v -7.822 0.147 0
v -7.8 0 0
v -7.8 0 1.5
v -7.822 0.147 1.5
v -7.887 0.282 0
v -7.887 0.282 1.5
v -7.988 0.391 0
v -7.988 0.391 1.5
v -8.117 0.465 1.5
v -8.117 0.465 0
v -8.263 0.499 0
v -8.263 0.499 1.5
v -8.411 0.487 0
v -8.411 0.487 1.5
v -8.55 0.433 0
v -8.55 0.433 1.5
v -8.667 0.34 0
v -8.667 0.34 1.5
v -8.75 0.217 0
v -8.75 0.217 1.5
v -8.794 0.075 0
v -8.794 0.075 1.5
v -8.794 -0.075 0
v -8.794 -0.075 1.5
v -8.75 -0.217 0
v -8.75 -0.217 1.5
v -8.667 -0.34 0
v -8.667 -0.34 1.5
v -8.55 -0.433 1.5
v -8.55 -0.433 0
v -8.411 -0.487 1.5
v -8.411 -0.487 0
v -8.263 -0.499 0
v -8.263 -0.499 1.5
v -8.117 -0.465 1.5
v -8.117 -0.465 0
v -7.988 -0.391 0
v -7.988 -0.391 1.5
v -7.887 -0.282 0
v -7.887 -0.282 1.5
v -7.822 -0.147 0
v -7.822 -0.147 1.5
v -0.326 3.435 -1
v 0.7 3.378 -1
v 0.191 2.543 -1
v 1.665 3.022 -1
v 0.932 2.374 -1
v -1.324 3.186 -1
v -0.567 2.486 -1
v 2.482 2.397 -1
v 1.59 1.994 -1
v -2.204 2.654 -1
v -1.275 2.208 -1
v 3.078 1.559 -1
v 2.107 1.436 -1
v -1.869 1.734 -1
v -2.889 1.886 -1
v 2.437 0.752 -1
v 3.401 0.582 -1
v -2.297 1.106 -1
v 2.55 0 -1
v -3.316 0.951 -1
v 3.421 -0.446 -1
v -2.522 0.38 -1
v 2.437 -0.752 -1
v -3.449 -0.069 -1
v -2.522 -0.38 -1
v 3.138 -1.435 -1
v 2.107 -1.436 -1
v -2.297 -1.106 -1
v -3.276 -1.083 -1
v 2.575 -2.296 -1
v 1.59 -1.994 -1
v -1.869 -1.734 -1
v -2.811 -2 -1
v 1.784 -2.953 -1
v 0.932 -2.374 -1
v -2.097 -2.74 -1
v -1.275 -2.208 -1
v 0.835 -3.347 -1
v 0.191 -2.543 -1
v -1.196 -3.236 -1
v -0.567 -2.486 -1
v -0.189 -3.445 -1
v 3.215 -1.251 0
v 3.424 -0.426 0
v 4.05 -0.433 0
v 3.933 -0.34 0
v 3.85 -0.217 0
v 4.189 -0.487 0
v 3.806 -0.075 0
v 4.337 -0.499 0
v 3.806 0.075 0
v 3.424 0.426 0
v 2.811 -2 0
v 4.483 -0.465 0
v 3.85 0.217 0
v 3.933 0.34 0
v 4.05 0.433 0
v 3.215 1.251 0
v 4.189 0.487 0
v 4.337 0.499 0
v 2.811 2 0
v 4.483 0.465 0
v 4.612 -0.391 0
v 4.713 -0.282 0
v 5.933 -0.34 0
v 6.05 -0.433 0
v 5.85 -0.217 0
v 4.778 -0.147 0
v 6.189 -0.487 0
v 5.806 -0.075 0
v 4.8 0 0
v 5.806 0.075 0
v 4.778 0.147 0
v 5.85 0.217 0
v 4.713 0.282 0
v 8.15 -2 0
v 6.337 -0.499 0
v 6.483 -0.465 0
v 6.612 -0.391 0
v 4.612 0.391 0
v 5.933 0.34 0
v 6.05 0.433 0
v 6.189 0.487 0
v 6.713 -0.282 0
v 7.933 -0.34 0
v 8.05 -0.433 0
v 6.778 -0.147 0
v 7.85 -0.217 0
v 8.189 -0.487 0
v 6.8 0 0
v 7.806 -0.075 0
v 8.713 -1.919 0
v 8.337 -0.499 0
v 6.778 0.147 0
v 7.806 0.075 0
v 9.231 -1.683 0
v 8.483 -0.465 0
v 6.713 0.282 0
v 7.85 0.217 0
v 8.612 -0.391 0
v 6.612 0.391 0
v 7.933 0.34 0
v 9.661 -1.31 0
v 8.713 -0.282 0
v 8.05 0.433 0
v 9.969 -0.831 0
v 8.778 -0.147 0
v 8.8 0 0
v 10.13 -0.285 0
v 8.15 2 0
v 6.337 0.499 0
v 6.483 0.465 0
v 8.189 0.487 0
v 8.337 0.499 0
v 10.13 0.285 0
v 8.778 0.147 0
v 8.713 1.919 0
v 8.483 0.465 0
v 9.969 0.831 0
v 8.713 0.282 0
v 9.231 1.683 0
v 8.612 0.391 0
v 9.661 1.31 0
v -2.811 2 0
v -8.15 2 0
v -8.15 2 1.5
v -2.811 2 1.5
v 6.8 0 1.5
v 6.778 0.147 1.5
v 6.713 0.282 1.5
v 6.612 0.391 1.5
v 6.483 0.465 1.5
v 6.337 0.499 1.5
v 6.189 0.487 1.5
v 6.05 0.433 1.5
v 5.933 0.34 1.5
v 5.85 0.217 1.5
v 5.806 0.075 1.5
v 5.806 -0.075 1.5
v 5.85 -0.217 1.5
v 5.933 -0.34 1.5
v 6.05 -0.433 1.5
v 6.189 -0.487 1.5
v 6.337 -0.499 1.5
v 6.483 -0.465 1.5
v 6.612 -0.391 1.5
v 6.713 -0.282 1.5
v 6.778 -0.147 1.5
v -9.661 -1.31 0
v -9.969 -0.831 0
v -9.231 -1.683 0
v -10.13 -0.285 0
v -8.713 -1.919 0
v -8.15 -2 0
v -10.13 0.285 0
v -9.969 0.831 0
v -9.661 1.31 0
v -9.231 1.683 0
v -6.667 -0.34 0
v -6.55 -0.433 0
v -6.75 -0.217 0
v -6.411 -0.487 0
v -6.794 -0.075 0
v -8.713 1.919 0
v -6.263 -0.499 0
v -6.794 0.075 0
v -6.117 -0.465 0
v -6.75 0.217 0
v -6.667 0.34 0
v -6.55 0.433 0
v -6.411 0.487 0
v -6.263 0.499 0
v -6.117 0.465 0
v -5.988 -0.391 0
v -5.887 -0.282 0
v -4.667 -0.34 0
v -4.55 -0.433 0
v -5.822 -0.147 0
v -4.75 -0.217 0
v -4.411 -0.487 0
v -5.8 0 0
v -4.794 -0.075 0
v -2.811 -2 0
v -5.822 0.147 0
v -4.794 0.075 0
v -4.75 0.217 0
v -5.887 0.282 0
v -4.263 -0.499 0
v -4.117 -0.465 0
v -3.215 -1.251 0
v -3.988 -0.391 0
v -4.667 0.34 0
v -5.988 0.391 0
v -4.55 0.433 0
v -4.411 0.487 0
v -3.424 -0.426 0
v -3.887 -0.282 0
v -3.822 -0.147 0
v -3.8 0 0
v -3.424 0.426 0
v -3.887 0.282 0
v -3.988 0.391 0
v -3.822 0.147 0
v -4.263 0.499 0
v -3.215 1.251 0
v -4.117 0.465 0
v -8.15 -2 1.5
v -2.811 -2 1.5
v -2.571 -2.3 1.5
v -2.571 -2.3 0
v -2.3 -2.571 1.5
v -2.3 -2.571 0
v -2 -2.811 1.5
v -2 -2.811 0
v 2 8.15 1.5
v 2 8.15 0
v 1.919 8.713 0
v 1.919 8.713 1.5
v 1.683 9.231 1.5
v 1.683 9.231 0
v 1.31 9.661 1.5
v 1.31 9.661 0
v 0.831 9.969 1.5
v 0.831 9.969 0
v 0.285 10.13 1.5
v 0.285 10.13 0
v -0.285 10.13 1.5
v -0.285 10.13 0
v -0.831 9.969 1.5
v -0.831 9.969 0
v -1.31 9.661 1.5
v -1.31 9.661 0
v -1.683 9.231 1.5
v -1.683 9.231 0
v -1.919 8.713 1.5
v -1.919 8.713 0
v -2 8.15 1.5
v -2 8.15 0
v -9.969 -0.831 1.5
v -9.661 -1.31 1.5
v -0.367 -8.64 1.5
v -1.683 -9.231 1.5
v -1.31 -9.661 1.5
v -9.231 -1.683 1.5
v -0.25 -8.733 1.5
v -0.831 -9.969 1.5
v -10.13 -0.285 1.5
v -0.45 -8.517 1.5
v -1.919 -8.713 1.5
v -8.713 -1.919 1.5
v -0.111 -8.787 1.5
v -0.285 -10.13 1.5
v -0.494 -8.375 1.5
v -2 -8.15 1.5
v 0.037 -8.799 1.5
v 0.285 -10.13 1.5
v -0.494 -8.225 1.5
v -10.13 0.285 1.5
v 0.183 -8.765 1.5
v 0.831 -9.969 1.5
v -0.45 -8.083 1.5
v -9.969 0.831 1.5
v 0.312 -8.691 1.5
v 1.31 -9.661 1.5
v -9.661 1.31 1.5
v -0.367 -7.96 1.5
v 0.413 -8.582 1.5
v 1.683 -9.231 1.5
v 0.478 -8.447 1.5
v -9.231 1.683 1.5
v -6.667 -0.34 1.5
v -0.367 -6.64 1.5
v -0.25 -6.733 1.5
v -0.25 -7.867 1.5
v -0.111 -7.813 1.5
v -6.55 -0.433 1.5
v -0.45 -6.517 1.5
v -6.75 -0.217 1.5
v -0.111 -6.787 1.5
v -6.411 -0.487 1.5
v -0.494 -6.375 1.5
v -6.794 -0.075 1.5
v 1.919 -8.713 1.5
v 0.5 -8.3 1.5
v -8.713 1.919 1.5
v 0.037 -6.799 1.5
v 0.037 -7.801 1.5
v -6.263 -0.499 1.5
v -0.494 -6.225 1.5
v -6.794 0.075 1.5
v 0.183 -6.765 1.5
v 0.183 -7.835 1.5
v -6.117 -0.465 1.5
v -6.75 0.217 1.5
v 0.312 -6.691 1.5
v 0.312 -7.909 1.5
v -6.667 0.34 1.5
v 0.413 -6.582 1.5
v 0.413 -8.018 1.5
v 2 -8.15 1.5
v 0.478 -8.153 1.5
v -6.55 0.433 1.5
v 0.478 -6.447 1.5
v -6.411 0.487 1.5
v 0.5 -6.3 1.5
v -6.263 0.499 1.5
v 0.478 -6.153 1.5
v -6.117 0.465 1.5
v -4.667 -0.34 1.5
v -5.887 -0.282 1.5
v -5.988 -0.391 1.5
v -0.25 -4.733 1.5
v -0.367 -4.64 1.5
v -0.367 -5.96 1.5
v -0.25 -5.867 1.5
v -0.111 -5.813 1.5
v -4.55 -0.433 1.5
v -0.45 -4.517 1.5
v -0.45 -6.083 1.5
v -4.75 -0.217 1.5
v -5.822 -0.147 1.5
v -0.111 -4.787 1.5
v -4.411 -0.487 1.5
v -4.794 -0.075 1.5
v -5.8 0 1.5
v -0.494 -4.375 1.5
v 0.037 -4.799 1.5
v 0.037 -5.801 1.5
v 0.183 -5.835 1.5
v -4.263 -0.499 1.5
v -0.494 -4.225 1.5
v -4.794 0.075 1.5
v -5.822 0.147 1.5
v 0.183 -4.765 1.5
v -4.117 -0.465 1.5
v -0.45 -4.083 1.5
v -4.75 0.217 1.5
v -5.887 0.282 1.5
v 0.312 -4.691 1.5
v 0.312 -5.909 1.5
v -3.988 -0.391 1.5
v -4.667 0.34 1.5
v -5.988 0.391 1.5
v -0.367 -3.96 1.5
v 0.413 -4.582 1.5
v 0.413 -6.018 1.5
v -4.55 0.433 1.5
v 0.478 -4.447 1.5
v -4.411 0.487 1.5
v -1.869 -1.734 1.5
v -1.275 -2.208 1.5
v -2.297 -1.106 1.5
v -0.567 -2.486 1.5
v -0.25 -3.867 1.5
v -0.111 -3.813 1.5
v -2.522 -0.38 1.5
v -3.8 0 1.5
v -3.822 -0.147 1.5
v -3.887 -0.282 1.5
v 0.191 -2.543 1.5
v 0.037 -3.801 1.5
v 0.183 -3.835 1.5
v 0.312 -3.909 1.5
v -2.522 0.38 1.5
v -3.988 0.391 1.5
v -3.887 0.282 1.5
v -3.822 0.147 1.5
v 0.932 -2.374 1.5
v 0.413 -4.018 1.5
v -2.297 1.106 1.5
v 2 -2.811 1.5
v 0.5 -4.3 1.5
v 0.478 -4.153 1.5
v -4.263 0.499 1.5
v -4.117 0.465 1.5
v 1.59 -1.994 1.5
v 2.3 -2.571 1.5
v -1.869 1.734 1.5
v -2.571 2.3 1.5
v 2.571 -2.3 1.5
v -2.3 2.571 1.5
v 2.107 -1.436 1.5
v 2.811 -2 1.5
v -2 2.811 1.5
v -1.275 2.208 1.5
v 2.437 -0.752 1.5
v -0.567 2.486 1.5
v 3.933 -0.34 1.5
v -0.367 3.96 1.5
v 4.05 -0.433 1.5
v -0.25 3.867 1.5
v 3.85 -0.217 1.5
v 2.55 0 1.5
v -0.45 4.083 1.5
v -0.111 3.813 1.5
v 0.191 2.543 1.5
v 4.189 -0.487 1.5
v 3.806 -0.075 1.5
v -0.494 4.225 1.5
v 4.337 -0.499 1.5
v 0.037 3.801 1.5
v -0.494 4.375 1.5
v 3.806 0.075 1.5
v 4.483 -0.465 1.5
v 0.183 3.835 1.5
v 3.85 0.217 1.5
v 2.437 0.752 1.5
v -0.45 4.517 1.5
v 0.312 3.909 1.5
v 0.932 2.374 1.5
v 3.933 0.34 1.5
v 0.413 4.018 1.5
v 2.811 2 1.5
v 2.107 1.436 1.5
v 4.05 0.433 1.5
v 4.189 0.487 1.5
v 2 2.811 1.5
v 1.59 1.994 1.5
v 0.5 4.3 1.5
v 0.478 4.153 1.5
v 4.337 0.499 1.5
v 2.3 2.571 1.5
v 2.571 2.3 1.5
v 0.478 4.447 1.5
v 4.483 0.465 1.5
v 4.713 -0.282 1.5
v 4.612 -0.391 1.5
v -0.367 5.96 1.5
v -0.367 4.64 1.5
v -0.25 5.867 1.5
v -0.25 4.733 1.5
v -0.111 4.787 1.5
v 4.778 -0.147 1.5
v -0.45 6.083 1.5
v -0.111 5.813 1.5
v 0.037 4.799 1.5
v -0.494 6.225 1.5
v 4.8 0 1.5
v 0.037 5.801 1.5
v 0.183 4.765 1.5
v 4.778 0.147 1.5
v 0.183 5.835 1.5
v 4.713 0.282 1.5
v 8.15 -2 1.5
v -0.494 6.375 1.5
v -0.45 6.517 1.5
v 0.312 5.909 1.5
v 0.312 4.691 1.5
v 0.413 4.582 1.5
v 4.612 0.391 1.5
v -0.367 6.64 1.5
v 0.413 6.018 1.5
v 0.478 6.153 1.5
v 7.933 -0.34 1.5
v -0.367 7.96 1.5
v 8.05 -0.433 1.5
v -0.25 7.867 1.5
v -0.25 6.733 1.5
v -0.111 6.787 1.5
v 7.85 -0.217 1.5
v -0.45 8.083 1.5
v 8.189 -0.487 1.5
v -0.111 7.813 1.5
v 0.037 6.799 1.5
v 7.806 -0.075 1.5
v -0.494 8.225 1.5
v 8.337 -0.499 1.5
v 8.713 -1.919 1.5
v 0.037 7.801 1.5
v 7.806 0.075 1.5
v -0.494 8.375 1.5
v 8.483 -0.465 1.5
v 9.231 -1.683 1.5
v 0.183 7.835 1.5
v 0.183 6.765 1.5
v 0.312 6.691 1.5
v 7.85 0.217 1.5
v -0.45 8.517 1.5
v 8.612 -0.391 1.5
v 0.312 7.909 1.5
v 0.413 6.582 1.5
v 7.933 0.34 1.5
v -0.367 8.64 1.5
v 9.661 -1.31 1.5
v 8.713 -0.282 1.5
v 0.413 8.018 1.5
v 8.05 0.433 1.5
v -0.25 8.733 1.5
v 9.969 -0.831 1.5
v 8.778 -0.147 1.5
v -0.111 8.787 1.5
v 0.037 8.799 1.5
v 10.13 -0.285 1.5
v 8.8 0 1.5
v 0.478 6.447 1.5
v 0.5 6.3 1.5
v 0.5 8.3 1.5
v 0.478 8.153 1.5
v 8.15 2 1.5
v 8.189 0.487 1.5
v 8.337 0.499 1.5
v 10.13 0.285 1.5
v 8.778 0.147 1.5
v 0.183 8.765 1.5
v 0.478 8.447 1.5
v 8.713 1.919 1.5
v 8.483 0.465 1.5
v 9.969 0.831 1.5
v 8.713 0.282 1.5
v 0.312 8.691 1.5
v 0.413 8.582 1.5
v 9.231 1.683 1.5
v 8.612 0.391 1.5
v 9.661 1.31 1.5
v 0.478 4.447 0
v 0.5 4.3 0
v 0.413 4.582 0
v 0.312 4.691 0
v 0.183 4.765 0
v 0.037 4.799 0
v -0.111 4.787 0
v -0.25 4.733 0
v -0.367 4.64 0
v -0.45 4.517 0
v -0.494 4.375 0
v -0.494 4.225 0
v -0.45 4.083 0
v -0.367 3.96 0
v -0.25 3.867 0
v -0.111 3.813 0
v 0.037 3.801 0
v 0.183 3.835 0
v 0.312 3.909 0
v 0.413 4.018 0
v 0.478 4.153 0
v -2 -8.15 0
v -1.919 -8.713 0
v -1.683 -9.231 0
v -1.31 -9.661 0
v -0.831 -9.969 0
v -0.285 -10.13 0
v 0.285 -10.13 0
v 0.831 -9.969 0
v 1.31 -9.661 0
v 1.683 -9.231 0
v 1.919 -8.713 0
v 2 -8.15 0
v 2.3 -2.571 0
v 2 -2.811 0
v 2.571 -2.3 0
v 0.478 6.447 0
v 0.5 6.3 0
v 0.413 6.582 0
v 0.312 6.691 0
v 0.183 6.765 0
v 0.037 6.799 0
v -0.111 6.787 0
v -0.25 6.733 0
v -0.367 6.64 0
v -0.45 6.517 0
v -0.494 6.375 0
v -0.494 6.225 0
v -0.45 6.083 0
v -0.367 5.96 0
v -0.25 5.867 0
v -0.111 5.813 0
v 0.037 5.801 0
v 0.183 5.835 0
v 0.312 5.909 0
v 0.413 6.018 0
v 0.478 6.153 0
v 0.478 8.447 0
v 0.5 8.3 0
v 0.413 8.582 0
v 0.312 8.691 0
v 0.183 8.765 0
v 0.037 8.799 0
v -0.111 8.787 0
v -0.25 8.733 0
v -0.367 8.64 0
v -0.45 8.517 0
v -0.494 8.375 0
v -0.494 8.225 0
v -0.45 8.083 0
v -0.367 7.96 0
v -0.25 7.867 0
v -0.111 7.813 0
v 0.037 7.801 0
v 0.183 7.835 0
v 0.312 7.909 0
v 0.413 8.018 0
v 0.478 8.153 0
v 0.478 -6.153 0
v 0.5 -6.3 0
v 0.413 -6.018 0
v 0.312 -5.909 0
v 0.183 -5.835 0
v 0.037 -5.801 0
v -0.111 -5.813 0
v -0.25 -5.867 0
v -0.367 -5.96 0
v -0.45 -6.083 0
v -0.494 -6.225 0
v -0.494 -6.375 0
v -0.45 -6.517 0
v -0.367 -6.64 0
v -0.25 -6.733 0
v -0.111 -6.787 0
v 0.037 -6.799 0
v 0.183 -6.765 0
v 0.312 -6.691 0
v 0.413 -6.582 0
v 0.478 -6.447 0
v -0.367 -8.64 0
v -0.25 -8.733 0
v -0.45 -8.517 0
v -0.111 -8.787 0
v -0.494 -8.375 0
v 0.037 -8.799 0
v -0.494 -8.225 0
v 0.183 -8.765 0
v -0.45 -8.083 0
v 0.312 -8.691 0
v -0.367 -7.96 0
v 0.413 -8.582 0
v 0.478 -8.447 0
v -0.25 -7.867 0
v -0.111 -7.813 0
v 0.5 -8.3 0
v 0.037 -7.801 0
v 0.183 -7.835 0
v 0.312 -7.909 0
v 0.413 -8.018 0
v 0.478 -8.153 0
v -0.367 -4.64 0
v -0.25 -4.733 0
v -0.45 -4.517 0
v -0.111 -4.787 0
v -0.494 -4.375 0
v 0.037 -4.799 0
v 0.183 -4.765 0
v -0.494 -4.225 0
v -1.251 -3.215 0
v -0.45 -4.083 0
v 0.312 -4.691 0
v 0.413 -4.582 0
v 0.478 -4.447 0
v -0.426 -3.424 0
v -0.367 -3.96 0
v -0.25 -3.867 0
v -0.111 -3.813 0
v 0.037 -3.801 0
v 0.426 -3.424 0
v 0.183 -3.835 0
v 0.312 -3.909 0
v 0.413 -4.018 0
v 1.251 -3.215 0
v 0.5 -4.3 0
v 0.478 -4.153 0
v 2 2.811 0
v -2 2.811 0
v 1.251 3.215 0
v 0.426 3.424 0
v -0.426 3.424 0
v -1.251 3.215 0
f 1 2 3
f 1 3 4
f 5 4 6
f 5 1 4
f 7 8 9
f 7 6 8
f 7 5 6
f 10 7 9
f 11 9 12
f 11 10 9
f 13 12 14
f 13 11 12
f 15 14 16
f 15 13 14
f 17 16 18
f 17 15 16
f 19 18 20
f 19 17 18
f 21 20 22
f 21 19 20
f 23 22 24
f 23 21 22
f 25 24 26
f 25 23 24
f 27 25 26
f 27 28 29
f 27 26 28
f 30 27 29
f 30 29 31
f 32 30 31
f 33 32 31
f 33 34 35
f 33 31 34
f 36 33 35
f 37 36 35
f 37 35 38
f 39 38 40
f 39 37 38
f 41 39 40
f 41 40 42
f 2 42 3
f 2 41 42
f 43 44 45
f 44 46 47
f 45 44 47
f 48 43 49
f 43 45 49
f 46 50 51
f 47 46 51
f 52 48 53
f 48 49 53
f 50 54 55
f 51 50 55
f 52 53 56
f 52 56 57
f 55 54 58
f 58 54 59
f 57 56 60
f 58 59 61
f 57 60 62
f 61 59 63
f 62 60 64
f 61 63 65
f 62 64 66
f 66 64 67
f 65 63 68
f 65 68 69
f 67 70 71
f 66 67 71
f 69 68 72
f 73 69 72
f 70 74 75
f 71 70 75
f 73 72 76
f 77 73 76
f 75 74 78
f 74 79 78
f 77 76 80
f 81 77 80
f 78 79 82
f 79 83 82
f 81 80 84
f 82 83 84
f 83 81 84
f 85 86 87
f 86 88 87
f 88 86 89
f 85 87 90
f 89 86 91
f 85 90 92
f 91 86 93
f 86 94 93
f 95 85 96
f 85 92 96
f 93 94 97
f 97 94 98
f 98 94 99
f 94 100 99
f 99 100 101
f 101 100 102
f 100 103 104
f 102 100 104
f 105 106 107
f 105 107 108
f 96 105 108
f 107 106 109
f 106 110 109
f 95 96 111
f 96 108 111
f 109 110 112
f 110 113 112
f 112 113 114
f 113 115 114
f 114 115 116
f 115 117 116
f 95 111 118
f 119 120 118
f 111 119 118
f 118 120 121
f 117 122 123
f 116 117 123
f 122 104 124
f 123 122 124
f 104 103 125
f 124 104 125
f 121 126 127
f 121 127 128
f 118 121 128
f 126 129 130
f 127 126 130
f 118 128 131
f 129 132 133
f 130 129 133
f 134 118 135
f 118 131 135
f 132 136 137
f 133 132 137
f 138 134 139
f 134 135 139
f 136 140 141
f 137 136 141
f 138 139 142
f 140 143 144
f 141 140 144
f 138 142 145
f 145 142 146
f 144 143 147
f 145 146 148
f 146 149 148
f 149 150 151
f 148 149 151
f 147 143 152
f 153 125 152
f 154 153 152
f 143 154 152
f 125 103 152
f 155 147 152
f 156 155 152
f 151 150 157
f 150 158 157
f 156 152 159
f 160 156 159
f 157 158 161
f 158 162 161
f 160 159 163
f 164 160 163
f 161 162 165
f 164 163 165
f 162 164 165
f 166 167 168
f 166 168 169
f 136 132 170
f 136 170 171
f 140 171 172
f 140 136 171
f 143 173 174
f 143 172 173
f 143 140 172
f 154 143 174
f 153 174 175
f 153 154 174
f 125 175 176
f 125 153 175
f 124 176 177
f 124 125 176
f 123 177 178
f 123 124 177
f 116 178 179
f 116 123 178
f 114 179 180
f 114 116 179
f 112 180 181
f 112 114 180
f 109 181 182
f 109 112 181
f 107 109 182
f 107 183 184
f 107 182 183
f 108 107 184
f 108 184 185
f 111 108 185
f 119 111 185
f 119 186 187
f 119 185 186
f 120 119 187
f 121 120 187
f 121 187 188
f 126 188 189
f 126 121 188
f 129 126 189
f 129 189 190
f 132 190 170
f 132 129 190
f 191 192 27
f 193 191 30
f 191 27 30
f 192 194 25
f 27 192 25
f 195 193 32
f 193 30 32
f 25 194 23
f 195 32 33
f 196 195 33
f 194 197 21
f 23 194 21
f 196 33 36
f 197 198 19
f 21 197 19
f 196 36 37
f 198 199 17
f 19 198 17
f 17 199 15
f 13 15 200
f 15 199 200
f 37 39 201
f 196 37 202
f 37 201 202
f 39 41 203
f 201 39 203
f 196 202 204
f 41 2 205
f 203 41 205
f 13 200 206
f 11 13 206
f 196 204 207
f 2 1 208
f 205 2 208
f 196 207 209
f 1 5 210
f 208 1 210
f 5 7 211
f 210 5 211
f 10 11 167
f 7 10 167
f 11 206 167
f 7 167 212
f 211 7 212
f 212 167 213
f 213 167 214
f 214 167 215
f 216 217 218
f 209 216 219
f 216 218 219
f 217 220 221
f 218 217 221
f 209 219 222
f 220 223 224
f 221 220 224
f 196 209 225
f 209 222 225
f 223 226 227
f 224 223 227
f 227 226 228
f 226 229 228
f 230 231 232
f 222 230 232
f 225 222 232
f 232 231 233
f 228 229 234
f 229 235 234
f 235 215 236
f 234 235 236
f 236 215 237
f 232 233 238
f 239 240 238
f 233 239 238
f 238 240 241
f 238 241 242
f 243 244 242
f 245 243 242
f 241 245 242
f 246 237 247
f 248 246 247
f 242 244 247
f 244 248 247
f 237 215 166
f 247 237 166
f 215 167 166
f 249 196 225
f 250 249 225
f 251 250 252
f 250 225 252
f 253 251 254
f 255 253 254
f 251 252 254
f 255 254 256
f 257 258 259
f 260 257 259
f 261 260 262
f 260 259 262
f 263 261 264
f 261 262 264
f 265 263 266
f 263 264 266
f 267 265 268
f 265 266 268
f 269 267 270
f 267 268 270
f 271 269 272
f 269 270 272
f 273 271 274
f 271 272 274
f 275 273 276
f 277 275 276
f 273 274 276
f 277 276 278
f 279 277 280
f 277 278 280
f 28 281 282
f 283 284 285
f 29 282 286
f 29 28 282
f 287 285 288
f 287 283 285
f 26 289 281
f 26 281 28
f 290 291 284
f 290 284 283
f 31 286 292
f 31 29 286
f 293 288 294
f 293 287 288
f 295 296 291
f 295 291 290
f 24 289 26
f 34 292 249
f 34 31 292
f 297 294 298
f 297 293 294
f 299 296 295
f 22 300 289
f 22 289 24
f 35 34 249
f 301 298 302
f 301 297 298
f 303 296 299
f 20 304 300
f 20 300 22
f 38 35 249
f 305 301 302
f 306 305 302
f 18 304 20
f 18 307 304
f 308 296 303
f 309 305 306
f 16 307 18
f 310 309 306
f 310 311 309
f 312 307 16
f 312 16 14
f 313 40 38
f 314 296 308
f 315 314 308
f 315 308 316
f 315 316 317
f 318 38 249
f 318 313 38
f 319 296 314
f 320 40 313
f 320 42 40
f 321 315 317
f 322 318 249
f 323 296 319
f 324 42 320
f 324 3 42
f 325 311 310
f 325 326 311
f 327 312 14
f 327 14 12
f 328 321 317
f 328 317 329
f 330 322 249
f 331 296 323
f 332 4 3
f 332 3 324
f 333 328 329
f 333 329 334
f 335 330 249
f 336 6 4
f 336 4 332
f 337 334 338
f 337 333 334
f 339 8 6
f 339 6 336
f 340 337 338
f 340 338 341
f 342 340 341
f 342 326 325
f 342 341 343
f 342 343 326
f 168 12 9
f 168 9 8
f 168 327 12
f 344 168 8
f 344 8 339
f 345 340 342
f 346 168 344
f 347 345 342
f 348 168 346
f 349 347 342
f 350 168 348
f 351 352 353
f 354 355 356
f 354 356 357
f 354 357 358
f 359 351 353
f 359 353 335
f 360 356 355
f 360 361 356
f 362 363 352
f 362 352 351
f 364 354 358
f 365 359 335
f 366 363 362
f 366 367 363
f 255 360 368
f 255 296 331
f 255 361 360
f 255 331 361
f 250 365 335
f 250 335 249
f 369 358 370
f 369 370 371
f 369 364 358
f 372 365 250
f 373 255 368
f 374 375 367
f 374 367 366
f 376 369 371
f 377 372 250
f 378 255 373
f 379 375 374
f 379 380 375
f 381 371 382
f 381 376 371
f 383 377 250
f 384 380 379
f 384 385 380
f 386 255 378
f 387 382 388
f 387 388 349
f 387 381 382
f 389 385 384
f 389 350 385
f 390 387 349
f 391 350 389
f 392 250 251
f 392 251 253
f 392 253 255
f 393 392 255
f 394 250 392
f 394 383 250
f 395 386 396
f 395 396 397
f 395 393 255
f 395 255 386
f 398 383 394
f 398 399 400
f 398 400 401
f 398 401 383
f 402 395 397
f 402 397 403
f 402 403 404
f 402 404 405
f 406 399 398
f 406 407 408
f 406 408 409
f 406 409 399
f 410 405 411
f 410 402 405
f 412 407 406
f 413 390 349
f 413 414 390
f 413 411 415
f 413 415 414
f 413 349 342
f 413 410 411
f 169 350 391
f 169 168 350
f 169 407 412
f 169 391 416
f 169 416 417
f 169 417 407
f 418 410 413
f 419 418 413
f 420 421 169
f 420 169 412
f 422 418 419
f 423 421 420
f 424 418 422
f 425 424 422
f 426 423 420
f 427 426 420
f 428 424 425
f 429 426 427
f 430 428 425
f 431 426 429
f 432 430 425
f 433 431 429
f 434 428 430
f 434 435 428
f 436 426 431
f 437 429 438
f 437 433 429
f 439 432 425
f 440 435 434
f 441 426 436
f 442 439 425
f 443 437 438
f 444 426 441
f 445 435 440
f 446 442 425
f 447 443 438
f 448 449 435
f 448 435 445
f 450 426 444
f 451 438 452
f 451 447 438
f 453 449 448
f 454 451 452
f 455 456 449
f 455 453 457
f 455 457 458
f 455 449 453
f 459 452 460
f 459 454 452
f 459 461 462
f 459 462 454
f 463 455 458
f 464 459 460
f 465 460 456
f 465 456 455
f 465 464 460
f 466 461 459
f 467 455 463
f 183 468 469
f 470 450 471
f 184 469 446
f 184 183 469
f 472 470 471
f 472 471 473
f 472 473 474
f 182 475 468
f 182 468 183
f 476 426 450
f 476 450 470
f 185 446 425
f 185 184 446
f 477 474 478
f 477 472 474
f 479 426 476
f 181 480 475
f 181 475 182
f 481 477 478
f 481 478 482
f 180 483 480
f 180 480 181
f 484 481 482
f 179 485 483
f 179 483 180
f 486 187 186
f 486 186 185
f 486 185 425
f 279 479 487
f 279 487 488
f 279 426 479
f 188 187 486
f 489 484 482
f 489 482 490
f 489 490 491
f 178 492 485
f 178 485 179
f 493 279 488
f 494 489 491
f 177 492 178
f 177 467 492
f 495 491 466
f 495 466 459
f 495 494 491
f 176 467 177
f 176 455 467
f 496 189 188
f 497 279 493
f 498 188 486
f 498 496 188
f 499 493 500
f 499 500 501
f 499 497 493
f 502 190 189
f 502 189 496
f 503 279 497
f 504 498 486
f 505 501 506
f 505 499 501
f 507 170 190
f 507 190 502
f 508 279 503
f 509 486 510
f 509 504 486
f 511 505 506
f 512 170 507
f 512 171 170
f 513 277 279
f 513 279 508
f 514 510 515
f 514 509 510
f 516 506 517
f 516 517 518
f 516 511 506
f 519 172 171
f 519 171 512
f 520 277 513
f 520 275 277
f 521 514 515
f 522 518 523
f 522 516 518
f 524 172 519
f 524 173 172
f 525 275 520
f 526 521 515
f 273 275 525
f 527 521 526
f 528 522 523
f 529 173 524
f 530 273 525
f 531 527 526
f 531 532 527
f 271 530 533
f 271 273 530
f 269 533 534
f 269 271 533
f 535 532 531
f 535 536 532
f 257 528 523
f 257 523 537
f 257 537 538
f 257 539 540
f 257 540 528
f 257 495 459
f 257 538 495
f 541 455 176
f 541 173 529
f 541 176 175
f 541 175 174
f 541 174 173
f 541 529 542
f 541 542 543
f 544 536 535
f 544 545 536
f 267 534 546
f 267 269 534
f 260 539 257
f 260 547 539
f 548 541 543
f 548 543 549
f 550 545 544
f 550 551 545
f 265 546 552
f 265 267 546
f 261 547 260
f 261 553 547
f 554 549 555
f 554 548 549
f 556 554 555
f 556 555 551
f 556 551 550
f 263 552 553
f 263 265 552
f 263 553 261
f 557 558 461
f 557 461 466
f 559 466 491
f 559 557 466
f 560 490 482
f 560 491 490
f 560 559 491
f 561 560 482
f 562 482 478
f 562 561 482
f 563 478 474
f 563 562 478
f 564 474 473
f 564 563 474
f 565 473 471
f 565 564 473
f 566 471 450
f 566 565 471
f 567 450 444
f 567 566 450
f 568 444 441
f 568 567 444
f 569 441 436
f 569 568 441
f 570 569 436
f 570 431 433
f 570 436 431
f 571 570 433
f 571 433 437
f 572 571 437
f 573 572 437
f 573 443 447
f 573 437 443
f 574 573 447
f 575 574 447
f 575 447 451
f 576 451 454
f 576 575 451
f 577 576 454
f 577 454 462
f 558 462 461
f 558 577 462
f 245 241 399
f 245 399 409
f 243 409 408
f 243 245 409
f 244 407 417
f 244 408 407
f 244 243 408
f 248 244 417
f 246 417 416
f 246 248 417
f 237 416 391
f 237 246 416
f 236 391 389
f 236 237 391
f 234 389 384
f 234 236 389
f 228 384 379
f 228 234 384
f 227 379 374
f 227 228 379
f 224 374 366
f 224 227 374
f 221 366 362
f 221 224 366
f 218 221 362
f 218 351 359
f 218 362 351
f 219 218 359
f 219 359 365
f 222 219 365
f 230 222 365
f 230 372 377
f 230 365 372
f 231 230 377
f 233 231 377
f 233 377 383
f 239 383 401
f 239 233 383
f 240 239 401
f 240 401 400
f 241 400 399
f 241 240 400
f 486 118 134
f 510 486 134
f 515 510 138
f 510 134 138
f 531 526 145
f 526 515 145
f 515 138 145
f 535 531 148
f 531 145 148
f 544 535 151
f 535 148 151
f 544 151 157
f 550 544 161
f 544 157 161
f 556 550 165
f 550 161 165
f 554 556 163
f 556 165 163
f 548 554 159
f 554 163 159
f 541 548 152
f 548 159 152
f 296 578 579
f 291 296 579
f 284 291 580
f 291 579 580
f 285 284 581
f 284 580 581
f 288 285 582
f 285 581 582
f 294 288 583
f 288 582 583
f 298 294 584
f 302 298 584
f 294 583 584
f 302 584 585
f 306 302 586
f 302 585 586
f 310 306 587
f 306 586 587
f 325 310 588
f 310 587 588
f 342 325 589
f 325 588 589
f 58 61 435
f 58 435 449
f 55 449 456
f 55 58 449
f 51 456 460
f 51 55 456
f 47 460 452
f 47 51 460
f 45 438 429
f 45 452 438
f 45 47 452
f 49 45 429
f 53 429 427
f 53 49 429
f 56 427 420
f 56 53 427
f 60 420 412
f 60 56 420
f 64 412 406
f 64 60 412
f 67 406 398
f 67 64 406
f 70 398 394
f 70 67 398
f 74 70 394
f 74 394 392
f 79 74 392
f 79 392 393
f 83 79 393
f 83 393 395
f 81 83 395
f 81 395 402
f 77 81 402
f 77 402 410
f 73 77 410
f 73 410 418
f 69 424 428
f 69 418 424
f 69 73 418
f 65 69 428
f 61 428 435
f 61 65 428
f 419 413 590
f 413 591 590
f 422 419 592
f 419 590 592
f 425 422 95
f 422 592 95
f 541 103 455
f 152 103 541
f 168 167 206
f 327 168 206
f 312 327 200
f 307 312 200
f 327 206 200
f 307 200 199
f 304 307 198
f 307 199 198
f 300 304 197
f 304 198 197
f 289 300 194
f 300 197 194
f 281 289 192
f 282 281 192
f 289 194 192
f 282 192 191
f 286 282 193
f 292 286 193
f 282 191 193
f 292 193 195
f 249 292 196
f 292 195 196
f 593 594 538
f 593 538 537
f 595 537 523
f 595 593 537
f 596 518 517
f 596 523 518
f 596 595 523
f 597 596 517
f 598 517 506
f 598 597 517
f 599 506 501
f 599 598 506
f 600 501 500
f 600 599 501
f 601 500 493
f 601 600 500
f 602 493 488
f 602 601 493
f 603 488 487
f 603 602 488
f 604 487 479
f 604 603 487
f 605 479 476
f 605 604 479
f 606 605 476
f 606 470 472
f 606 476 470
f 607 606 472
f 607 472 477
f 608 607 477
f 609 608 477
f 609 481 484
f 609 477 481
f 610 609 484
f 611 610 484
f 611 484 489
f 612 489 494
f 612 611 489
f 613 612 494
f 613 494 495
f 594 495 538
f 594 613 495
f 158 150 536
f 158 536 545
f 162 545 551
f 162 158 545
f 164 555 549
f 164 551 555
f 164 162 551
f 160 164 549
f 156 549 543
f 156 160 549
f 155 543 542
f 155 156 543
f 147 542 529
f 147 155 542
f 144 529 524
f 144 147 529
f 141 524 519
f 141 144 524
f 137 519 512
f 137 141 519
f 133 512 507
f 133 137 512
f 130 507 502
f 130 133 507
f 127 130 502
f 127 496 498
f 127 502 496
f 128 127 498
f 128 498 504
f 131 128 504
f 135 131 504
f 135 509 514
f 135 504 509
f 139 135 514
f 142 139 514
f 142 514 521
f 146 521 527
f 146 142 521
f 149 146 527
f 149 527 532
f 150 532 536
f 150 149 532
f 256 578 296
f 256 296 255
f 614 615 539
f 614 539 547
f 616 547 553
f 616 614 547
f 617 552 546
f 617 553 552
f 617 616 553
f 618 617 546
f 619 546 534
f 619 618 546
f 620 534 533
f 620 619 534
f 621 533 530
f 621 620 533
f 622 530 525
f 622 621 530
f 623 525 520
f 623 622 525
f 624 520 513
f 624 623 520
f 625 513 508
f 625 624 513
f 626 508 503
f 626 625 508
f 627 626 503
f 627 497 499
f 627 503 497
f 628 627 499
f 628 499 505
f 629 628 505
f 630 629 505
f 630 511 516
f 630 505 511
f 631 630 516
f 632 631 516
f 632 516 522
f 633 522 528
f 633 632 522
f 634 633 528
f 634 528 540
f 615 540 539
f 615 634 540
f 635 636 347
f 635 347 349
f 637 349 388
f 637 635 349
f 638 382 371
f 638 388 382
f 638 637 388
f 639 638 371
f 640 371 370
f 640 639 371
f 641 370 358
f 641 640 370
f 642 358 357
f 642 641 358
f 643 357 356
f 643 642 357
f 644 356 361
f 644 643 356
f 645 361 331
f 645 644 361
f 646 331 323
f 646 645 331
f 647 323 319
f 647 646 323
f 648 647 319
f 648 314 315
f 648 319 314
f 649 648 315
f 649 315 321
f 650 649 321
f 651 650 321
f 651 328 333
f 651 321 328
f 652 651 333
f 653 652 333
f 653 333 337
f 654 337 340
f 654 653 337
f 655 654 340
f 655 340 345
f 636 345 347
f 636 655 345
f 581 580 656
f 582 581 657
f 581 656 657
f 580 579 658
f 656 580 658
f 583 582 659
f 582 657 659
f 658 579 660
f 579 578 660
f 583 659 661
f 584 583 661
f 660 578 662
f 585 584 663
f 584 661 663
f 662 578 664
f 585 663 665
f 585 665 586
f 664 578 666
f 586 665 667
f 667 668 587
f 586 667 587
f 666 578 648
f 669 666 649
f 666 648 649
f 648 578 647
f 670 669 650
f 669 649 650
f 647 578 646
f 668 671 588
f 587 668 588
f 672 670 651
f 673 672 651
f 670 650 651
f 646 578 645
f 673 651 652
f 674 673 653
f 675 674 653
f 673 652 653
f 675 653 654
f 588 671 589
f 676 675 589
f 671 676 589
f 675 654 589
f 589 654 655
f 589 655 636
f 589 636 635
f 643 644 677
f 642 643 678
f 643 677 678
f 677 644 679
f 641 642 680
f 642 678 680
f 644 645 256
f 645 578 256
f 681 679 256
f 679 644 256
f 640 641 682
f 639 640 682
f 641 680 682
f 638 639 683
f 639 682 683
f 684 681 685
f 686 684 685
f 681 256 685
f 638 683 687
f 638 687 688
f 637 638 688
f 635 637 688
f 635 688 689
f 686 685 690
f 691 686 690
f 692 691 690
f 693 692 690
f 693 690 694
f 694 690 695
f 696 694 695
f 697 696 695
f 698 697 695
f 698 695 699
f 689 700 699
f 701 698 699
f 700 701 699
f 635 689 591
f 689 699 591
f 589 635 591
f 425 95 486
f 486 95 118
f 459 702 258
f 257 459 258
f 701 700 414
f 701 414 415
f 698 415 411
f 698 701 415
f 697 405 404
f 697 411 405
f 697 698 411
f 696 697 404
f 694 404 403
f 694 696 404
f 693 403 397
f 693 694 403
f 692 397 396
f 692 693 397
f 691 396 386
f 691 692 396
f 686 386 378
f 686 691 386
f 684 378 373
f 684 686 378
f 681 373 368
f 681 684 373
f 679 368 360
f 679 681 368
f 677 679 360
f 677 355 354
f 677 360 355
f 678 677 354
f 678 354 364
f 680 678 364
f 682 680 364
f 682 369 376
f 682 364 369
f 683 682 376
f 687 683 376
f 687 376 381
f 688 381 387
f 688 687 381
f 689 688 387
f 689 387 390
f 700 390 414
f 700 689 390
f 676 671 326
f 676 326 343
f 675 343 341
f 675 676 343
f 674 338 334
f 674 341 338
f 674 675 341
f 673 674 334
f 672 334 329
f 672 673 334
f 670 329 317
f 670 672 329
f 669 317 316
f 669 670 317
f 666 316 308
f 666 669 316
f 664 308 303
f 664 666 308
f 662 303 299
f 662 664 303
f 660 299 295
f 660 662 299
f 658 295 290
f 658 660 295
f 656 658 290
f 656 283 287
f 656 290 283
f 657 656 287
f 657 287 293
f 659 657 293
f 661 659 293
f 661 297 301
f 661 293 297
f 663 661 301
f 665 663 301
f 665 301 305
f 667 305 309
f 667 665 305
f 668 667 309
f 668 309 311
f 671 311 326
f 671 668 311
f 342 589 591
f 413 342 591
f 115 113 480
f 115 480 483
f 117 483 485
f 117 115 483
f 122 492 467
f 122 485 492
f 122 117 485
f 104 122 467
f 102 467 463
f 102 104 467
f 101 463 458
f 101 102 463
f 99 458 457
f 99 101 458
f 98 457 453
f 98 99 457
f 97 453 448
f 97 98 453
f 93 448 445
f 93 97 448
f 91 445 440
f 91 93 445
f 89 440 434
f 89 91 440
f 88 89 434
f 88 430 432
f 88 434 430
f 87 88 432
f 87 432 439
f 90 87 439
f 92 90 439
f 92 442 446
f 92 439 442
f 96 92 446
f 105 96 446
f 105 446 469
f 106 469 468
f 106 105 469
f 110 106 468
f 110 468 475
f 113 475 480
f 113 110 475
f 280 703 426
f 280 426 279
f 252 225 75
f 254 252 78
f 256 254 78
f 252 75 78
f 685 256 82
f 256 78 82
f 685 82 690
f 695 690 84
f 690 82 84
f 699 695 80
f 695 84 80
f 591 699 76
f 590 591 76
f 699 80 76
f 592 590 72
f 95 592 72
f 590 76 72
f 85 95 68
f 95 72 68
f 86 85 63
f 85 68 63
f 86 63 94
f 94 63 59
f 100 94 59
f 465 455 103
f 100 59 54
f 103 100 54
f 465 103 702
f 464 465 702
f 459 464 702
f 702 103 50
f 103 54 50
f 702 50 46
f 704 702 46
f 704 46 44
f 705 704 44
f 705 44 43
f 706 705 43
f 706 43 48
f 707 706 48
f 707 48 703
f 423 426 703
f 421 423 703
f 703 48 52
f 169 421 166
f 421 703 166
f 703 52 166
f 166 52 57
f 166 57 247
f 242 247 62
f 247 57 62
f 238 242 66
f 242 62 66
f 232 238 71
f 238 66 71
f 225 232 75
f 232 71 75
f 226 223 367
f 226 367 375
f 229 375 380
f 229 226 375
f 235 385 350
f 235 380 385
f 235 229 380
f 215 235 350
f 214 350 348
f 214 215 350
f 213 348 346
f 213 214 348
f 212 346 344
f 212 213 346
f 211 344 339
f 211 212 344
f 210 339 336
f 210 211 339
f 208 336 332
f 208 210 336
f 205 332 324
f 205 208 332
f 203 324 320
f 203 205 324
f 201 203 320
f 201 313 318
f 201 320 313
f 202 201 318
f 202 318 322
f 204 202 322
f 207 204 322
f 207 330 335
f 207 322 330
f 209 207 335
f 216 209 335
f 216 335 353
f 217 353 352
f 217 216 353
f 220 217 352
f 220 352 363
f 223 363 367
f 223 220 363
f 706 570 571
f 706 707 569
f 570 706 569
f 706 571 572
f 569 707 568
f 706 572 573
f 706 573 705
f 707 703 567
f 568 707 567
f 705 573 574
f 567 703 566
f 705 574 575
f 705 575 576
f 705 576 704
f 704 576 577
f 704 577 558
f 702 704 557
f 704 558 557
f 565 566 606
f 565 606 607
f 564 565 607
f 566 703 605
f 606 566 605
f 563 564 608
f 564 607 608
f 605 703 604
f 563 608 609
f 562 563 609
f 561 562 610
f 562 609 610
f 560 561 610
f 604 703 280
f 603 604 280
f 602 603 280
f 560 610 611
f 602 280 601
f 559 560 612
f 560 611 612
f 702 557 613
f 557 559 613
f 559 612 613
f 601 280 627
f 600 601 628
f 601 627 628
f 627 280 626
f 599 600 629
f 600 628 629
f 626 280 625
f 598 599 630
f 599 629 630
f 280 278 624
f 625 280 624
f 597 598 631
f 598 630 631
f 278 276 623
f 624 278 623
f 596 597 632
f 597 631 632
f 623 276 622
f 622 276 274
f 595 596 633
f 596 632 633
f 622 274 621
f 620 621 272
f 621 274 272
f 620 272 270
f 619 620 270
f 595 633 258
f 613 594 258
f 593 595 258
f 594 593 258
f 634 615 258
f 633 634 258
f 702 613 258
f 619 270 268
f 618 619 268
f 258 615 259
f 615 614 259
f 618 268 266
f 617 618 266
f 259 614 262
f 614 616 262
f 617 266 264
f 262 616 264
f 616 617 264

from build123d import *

# Parameters (mm, degrees)
COMPACT_HORN_CENTER_OD6P9_PROFILE_R        = 3.45
COMPACT_HORN_CENTER_OD6P9_DEPTH            = 1.5
HORIZONTAL_BLADES_ASSUMED_WIDTH4_PROFILE_W = 16.3
HORIZONTAL_BLADES_ASSUMED_WIDTH4_PROFILE_H = 4
HORIZONTAL_BLADES_ASSUMED_WIDTH4_DEPTH     = 1.5
VERTICAL_BLADES_ASSUMED_WIDTH4_PROFILE_W   = 4
VERTICAL_BLADES_ASSUMED_WIDTH4_PROFILE_H   = 16.3
VERTICAL_BLADES_ASSUMED_WIDTH4_DEPTH       = 1.5
ROUNDED_BLADE_TIPS_R                       = 2
ROUNDED_TIPS_SPAN20P3_DEPTH                = 1.5
HUB_TOTAL_HEIGHT2P5_START                  = -1
HUB_TOTAL_HEIGHT2P5_PROFILE_R              = 3.45
HUB_TOTAL_HEIGHT2P5_DEPTH                  = 1
PURCHASED_SPLINE_INTERNALS_OMITTED_START   = -50
PURCHASED_SPLINE_INTERNALS_OMITTED_PROFI_R = 2.55
PURCHASED_SPLINE_INTERNALS_OMITTED_DEPTH   = 65.432428763
UNMODIFIED_STOCK_PILOT_HOLES_START         = -50
UNMODIFIED_STOCK_PILOT_HOLES_PROFILE_R     = 0.5
UNMODIFIED_STOCK_PILOT_HOLES_DEPTH         = 65.432428763


with BuildPart() as part:
    # Compact_horn_center_OD6p9_profile → Compact_horn_center_OD6p9 (new body)
    with BuildSketch(Plane.XY):
        Circle(COMPACT_HORN_CENTER_OD6P9_PROFILE_R)
    extrude(amount=COMPACT_HORN_CENTER_OD6P9_DEPTH)

    # Horizontal_blades_assumed_width4_profile → Horizontal_blades_assumed_width4 (add)
    with BuildSketch(Plane.XY):
        Rectangle(HORIZONTAL_BLADES_ASSUMED_WIDTH4_PROFILE_W, HORIZONTAL_BLADES_ASSUMED_WIDTH4_PROFILE_H)
    extrude(amount=HORIZONTAL_BLADES_ASSUMED_WIDTH4_DEPTH)

    # Vertical_blades_assumed_width4_profile → Vertical_blades_assumed_width4 (add)
    with BuildSketch(Plane.XY):
        Rectangle(VERTICAL_BLADES_ASSUMED_WIDTH4_PROFILE_W, VERTICAL_BLADES_ASSUMED_WIDTH4_PROFILE_H)
    extrude(amount=VERTICAL_BLADES_ASSUMED_WIDTH4_DEPTH)

    # Rounded_blade_tips → Rounded_tips_span20p3 (add)
    with BuildSketch(Plane.XY):
        with Locations((8.15, 0)):
            Circle(ROUNDED_BLADE_TIPS_R)
        with Locations((-8.15, 0)):
            Circle(ROUNDED_BLADE_TIPS_R)
        with Locations((0, 8.15)):
            Circle(ROUNDED_BLADE_TIPS_R)
        with Locations((0, -8.15)):
            Circle(ROUNDED_BLADE_TIPS_R)
    extrude(amount=ROUNDED_TIPS_SPAN20P3_DEPTH)

    # Hub_total_height2p5_profile → Hub_total_height2p5 (add)
    with BuildSketch(Plane.XY.offset(HUB_TOTAL_HEIGHT2P5_START)):
        with Locations(Location((0, 0, 0), (0, 0, 215.43015836))):
            Circle(HUB_TOTAL_HEIGHT2P5_PROFILE_R)
    extrude(amount=HUB_TOTAL_HEIGHT2P5_DEPTH)

    # Purchased_spline_internals_omitted_profile → Purchased_spline_internals_omitted (cut, through all)
    with BuildSketch(Plane.XY.offset(PURCHASED_SPLINE_INTERNALS_OMITTED_START)):
        Circle(PURCHASED_SPLINE_INTERNALS_OMITTED_PROFI_R)
    extrude(amount=PURCHASED_SPLINE_INTERNALS_OMITTED_DEPTH, mode=Mode.SUBTRACT)

    # Unmodified_stock_pilot_holes_profile → Unmodified_stock_pilot_holes (cut, through all)
    with BuildSketch(Plane.XY.offset(UNMODIFIED_STOCK_PILOT_HOLES_START)):
        with Locations((-8.3, 0)):
            Circle(UNMODIFIED_STOCK_PILOT_HOLES_PROFILE_R)
        with Locations((-6.3, 0)):
            Circle(UNMODIFIED_STOCK_PILOT_HOLES_PROFILE_R)
        with Locations((-4.3, 0)):
            Circle(UNMODIFIED_STOCK_PILOT_HOLES_PROFILE_R)
        with Locations((4.3, 0)):
            Circle(UNMODIFIED_STOCK_PILOT_HOLES_PROFILE_R)
        with Locations((6.3, 0)):
            Circle(UNMODIFIED_STOCK_PILOT_HOLES_PROFILE_R)
        with Locations((8.3, 0)):
            Circle(UNMODIFIED_STOCK_PILOT_HOLES_PROFILE_R)
        with Locations((0, -8.3)):
            Circle(UNMODIFIED_STOCK_PILOT_HOLES_PROFILE_R)
        with Locations((0, -6.3)):
            Circle(UNMODIFIED_STOCK_PILOT_HOLES_PROFILE_R)
        with Locations((0, -4.3)):
            Circle(UNMODIFIED_STOCK_PILOT_HOLES_PROFILE_R)
        with Locations((0, 4.3)):
            Circle(UNMODIFIED_STOCK_PILOT_HOLES_PROFILE_R)
        with Locations((0, 6.3)):
            Circle(UNMODIFIED_STOCK_PILOT_HOLES_PROFILE_R)
        with Locations((0, 8.3)):
            Circle(UNMODIFIED_STOCK_PILOT_HOLES_PROFILE_R)
    extrude(amount=UNMODIFIED_STOCK_PILOT_HOLES_DEPTH, mode=Mode.SUBTRACT)


solid = part.part
